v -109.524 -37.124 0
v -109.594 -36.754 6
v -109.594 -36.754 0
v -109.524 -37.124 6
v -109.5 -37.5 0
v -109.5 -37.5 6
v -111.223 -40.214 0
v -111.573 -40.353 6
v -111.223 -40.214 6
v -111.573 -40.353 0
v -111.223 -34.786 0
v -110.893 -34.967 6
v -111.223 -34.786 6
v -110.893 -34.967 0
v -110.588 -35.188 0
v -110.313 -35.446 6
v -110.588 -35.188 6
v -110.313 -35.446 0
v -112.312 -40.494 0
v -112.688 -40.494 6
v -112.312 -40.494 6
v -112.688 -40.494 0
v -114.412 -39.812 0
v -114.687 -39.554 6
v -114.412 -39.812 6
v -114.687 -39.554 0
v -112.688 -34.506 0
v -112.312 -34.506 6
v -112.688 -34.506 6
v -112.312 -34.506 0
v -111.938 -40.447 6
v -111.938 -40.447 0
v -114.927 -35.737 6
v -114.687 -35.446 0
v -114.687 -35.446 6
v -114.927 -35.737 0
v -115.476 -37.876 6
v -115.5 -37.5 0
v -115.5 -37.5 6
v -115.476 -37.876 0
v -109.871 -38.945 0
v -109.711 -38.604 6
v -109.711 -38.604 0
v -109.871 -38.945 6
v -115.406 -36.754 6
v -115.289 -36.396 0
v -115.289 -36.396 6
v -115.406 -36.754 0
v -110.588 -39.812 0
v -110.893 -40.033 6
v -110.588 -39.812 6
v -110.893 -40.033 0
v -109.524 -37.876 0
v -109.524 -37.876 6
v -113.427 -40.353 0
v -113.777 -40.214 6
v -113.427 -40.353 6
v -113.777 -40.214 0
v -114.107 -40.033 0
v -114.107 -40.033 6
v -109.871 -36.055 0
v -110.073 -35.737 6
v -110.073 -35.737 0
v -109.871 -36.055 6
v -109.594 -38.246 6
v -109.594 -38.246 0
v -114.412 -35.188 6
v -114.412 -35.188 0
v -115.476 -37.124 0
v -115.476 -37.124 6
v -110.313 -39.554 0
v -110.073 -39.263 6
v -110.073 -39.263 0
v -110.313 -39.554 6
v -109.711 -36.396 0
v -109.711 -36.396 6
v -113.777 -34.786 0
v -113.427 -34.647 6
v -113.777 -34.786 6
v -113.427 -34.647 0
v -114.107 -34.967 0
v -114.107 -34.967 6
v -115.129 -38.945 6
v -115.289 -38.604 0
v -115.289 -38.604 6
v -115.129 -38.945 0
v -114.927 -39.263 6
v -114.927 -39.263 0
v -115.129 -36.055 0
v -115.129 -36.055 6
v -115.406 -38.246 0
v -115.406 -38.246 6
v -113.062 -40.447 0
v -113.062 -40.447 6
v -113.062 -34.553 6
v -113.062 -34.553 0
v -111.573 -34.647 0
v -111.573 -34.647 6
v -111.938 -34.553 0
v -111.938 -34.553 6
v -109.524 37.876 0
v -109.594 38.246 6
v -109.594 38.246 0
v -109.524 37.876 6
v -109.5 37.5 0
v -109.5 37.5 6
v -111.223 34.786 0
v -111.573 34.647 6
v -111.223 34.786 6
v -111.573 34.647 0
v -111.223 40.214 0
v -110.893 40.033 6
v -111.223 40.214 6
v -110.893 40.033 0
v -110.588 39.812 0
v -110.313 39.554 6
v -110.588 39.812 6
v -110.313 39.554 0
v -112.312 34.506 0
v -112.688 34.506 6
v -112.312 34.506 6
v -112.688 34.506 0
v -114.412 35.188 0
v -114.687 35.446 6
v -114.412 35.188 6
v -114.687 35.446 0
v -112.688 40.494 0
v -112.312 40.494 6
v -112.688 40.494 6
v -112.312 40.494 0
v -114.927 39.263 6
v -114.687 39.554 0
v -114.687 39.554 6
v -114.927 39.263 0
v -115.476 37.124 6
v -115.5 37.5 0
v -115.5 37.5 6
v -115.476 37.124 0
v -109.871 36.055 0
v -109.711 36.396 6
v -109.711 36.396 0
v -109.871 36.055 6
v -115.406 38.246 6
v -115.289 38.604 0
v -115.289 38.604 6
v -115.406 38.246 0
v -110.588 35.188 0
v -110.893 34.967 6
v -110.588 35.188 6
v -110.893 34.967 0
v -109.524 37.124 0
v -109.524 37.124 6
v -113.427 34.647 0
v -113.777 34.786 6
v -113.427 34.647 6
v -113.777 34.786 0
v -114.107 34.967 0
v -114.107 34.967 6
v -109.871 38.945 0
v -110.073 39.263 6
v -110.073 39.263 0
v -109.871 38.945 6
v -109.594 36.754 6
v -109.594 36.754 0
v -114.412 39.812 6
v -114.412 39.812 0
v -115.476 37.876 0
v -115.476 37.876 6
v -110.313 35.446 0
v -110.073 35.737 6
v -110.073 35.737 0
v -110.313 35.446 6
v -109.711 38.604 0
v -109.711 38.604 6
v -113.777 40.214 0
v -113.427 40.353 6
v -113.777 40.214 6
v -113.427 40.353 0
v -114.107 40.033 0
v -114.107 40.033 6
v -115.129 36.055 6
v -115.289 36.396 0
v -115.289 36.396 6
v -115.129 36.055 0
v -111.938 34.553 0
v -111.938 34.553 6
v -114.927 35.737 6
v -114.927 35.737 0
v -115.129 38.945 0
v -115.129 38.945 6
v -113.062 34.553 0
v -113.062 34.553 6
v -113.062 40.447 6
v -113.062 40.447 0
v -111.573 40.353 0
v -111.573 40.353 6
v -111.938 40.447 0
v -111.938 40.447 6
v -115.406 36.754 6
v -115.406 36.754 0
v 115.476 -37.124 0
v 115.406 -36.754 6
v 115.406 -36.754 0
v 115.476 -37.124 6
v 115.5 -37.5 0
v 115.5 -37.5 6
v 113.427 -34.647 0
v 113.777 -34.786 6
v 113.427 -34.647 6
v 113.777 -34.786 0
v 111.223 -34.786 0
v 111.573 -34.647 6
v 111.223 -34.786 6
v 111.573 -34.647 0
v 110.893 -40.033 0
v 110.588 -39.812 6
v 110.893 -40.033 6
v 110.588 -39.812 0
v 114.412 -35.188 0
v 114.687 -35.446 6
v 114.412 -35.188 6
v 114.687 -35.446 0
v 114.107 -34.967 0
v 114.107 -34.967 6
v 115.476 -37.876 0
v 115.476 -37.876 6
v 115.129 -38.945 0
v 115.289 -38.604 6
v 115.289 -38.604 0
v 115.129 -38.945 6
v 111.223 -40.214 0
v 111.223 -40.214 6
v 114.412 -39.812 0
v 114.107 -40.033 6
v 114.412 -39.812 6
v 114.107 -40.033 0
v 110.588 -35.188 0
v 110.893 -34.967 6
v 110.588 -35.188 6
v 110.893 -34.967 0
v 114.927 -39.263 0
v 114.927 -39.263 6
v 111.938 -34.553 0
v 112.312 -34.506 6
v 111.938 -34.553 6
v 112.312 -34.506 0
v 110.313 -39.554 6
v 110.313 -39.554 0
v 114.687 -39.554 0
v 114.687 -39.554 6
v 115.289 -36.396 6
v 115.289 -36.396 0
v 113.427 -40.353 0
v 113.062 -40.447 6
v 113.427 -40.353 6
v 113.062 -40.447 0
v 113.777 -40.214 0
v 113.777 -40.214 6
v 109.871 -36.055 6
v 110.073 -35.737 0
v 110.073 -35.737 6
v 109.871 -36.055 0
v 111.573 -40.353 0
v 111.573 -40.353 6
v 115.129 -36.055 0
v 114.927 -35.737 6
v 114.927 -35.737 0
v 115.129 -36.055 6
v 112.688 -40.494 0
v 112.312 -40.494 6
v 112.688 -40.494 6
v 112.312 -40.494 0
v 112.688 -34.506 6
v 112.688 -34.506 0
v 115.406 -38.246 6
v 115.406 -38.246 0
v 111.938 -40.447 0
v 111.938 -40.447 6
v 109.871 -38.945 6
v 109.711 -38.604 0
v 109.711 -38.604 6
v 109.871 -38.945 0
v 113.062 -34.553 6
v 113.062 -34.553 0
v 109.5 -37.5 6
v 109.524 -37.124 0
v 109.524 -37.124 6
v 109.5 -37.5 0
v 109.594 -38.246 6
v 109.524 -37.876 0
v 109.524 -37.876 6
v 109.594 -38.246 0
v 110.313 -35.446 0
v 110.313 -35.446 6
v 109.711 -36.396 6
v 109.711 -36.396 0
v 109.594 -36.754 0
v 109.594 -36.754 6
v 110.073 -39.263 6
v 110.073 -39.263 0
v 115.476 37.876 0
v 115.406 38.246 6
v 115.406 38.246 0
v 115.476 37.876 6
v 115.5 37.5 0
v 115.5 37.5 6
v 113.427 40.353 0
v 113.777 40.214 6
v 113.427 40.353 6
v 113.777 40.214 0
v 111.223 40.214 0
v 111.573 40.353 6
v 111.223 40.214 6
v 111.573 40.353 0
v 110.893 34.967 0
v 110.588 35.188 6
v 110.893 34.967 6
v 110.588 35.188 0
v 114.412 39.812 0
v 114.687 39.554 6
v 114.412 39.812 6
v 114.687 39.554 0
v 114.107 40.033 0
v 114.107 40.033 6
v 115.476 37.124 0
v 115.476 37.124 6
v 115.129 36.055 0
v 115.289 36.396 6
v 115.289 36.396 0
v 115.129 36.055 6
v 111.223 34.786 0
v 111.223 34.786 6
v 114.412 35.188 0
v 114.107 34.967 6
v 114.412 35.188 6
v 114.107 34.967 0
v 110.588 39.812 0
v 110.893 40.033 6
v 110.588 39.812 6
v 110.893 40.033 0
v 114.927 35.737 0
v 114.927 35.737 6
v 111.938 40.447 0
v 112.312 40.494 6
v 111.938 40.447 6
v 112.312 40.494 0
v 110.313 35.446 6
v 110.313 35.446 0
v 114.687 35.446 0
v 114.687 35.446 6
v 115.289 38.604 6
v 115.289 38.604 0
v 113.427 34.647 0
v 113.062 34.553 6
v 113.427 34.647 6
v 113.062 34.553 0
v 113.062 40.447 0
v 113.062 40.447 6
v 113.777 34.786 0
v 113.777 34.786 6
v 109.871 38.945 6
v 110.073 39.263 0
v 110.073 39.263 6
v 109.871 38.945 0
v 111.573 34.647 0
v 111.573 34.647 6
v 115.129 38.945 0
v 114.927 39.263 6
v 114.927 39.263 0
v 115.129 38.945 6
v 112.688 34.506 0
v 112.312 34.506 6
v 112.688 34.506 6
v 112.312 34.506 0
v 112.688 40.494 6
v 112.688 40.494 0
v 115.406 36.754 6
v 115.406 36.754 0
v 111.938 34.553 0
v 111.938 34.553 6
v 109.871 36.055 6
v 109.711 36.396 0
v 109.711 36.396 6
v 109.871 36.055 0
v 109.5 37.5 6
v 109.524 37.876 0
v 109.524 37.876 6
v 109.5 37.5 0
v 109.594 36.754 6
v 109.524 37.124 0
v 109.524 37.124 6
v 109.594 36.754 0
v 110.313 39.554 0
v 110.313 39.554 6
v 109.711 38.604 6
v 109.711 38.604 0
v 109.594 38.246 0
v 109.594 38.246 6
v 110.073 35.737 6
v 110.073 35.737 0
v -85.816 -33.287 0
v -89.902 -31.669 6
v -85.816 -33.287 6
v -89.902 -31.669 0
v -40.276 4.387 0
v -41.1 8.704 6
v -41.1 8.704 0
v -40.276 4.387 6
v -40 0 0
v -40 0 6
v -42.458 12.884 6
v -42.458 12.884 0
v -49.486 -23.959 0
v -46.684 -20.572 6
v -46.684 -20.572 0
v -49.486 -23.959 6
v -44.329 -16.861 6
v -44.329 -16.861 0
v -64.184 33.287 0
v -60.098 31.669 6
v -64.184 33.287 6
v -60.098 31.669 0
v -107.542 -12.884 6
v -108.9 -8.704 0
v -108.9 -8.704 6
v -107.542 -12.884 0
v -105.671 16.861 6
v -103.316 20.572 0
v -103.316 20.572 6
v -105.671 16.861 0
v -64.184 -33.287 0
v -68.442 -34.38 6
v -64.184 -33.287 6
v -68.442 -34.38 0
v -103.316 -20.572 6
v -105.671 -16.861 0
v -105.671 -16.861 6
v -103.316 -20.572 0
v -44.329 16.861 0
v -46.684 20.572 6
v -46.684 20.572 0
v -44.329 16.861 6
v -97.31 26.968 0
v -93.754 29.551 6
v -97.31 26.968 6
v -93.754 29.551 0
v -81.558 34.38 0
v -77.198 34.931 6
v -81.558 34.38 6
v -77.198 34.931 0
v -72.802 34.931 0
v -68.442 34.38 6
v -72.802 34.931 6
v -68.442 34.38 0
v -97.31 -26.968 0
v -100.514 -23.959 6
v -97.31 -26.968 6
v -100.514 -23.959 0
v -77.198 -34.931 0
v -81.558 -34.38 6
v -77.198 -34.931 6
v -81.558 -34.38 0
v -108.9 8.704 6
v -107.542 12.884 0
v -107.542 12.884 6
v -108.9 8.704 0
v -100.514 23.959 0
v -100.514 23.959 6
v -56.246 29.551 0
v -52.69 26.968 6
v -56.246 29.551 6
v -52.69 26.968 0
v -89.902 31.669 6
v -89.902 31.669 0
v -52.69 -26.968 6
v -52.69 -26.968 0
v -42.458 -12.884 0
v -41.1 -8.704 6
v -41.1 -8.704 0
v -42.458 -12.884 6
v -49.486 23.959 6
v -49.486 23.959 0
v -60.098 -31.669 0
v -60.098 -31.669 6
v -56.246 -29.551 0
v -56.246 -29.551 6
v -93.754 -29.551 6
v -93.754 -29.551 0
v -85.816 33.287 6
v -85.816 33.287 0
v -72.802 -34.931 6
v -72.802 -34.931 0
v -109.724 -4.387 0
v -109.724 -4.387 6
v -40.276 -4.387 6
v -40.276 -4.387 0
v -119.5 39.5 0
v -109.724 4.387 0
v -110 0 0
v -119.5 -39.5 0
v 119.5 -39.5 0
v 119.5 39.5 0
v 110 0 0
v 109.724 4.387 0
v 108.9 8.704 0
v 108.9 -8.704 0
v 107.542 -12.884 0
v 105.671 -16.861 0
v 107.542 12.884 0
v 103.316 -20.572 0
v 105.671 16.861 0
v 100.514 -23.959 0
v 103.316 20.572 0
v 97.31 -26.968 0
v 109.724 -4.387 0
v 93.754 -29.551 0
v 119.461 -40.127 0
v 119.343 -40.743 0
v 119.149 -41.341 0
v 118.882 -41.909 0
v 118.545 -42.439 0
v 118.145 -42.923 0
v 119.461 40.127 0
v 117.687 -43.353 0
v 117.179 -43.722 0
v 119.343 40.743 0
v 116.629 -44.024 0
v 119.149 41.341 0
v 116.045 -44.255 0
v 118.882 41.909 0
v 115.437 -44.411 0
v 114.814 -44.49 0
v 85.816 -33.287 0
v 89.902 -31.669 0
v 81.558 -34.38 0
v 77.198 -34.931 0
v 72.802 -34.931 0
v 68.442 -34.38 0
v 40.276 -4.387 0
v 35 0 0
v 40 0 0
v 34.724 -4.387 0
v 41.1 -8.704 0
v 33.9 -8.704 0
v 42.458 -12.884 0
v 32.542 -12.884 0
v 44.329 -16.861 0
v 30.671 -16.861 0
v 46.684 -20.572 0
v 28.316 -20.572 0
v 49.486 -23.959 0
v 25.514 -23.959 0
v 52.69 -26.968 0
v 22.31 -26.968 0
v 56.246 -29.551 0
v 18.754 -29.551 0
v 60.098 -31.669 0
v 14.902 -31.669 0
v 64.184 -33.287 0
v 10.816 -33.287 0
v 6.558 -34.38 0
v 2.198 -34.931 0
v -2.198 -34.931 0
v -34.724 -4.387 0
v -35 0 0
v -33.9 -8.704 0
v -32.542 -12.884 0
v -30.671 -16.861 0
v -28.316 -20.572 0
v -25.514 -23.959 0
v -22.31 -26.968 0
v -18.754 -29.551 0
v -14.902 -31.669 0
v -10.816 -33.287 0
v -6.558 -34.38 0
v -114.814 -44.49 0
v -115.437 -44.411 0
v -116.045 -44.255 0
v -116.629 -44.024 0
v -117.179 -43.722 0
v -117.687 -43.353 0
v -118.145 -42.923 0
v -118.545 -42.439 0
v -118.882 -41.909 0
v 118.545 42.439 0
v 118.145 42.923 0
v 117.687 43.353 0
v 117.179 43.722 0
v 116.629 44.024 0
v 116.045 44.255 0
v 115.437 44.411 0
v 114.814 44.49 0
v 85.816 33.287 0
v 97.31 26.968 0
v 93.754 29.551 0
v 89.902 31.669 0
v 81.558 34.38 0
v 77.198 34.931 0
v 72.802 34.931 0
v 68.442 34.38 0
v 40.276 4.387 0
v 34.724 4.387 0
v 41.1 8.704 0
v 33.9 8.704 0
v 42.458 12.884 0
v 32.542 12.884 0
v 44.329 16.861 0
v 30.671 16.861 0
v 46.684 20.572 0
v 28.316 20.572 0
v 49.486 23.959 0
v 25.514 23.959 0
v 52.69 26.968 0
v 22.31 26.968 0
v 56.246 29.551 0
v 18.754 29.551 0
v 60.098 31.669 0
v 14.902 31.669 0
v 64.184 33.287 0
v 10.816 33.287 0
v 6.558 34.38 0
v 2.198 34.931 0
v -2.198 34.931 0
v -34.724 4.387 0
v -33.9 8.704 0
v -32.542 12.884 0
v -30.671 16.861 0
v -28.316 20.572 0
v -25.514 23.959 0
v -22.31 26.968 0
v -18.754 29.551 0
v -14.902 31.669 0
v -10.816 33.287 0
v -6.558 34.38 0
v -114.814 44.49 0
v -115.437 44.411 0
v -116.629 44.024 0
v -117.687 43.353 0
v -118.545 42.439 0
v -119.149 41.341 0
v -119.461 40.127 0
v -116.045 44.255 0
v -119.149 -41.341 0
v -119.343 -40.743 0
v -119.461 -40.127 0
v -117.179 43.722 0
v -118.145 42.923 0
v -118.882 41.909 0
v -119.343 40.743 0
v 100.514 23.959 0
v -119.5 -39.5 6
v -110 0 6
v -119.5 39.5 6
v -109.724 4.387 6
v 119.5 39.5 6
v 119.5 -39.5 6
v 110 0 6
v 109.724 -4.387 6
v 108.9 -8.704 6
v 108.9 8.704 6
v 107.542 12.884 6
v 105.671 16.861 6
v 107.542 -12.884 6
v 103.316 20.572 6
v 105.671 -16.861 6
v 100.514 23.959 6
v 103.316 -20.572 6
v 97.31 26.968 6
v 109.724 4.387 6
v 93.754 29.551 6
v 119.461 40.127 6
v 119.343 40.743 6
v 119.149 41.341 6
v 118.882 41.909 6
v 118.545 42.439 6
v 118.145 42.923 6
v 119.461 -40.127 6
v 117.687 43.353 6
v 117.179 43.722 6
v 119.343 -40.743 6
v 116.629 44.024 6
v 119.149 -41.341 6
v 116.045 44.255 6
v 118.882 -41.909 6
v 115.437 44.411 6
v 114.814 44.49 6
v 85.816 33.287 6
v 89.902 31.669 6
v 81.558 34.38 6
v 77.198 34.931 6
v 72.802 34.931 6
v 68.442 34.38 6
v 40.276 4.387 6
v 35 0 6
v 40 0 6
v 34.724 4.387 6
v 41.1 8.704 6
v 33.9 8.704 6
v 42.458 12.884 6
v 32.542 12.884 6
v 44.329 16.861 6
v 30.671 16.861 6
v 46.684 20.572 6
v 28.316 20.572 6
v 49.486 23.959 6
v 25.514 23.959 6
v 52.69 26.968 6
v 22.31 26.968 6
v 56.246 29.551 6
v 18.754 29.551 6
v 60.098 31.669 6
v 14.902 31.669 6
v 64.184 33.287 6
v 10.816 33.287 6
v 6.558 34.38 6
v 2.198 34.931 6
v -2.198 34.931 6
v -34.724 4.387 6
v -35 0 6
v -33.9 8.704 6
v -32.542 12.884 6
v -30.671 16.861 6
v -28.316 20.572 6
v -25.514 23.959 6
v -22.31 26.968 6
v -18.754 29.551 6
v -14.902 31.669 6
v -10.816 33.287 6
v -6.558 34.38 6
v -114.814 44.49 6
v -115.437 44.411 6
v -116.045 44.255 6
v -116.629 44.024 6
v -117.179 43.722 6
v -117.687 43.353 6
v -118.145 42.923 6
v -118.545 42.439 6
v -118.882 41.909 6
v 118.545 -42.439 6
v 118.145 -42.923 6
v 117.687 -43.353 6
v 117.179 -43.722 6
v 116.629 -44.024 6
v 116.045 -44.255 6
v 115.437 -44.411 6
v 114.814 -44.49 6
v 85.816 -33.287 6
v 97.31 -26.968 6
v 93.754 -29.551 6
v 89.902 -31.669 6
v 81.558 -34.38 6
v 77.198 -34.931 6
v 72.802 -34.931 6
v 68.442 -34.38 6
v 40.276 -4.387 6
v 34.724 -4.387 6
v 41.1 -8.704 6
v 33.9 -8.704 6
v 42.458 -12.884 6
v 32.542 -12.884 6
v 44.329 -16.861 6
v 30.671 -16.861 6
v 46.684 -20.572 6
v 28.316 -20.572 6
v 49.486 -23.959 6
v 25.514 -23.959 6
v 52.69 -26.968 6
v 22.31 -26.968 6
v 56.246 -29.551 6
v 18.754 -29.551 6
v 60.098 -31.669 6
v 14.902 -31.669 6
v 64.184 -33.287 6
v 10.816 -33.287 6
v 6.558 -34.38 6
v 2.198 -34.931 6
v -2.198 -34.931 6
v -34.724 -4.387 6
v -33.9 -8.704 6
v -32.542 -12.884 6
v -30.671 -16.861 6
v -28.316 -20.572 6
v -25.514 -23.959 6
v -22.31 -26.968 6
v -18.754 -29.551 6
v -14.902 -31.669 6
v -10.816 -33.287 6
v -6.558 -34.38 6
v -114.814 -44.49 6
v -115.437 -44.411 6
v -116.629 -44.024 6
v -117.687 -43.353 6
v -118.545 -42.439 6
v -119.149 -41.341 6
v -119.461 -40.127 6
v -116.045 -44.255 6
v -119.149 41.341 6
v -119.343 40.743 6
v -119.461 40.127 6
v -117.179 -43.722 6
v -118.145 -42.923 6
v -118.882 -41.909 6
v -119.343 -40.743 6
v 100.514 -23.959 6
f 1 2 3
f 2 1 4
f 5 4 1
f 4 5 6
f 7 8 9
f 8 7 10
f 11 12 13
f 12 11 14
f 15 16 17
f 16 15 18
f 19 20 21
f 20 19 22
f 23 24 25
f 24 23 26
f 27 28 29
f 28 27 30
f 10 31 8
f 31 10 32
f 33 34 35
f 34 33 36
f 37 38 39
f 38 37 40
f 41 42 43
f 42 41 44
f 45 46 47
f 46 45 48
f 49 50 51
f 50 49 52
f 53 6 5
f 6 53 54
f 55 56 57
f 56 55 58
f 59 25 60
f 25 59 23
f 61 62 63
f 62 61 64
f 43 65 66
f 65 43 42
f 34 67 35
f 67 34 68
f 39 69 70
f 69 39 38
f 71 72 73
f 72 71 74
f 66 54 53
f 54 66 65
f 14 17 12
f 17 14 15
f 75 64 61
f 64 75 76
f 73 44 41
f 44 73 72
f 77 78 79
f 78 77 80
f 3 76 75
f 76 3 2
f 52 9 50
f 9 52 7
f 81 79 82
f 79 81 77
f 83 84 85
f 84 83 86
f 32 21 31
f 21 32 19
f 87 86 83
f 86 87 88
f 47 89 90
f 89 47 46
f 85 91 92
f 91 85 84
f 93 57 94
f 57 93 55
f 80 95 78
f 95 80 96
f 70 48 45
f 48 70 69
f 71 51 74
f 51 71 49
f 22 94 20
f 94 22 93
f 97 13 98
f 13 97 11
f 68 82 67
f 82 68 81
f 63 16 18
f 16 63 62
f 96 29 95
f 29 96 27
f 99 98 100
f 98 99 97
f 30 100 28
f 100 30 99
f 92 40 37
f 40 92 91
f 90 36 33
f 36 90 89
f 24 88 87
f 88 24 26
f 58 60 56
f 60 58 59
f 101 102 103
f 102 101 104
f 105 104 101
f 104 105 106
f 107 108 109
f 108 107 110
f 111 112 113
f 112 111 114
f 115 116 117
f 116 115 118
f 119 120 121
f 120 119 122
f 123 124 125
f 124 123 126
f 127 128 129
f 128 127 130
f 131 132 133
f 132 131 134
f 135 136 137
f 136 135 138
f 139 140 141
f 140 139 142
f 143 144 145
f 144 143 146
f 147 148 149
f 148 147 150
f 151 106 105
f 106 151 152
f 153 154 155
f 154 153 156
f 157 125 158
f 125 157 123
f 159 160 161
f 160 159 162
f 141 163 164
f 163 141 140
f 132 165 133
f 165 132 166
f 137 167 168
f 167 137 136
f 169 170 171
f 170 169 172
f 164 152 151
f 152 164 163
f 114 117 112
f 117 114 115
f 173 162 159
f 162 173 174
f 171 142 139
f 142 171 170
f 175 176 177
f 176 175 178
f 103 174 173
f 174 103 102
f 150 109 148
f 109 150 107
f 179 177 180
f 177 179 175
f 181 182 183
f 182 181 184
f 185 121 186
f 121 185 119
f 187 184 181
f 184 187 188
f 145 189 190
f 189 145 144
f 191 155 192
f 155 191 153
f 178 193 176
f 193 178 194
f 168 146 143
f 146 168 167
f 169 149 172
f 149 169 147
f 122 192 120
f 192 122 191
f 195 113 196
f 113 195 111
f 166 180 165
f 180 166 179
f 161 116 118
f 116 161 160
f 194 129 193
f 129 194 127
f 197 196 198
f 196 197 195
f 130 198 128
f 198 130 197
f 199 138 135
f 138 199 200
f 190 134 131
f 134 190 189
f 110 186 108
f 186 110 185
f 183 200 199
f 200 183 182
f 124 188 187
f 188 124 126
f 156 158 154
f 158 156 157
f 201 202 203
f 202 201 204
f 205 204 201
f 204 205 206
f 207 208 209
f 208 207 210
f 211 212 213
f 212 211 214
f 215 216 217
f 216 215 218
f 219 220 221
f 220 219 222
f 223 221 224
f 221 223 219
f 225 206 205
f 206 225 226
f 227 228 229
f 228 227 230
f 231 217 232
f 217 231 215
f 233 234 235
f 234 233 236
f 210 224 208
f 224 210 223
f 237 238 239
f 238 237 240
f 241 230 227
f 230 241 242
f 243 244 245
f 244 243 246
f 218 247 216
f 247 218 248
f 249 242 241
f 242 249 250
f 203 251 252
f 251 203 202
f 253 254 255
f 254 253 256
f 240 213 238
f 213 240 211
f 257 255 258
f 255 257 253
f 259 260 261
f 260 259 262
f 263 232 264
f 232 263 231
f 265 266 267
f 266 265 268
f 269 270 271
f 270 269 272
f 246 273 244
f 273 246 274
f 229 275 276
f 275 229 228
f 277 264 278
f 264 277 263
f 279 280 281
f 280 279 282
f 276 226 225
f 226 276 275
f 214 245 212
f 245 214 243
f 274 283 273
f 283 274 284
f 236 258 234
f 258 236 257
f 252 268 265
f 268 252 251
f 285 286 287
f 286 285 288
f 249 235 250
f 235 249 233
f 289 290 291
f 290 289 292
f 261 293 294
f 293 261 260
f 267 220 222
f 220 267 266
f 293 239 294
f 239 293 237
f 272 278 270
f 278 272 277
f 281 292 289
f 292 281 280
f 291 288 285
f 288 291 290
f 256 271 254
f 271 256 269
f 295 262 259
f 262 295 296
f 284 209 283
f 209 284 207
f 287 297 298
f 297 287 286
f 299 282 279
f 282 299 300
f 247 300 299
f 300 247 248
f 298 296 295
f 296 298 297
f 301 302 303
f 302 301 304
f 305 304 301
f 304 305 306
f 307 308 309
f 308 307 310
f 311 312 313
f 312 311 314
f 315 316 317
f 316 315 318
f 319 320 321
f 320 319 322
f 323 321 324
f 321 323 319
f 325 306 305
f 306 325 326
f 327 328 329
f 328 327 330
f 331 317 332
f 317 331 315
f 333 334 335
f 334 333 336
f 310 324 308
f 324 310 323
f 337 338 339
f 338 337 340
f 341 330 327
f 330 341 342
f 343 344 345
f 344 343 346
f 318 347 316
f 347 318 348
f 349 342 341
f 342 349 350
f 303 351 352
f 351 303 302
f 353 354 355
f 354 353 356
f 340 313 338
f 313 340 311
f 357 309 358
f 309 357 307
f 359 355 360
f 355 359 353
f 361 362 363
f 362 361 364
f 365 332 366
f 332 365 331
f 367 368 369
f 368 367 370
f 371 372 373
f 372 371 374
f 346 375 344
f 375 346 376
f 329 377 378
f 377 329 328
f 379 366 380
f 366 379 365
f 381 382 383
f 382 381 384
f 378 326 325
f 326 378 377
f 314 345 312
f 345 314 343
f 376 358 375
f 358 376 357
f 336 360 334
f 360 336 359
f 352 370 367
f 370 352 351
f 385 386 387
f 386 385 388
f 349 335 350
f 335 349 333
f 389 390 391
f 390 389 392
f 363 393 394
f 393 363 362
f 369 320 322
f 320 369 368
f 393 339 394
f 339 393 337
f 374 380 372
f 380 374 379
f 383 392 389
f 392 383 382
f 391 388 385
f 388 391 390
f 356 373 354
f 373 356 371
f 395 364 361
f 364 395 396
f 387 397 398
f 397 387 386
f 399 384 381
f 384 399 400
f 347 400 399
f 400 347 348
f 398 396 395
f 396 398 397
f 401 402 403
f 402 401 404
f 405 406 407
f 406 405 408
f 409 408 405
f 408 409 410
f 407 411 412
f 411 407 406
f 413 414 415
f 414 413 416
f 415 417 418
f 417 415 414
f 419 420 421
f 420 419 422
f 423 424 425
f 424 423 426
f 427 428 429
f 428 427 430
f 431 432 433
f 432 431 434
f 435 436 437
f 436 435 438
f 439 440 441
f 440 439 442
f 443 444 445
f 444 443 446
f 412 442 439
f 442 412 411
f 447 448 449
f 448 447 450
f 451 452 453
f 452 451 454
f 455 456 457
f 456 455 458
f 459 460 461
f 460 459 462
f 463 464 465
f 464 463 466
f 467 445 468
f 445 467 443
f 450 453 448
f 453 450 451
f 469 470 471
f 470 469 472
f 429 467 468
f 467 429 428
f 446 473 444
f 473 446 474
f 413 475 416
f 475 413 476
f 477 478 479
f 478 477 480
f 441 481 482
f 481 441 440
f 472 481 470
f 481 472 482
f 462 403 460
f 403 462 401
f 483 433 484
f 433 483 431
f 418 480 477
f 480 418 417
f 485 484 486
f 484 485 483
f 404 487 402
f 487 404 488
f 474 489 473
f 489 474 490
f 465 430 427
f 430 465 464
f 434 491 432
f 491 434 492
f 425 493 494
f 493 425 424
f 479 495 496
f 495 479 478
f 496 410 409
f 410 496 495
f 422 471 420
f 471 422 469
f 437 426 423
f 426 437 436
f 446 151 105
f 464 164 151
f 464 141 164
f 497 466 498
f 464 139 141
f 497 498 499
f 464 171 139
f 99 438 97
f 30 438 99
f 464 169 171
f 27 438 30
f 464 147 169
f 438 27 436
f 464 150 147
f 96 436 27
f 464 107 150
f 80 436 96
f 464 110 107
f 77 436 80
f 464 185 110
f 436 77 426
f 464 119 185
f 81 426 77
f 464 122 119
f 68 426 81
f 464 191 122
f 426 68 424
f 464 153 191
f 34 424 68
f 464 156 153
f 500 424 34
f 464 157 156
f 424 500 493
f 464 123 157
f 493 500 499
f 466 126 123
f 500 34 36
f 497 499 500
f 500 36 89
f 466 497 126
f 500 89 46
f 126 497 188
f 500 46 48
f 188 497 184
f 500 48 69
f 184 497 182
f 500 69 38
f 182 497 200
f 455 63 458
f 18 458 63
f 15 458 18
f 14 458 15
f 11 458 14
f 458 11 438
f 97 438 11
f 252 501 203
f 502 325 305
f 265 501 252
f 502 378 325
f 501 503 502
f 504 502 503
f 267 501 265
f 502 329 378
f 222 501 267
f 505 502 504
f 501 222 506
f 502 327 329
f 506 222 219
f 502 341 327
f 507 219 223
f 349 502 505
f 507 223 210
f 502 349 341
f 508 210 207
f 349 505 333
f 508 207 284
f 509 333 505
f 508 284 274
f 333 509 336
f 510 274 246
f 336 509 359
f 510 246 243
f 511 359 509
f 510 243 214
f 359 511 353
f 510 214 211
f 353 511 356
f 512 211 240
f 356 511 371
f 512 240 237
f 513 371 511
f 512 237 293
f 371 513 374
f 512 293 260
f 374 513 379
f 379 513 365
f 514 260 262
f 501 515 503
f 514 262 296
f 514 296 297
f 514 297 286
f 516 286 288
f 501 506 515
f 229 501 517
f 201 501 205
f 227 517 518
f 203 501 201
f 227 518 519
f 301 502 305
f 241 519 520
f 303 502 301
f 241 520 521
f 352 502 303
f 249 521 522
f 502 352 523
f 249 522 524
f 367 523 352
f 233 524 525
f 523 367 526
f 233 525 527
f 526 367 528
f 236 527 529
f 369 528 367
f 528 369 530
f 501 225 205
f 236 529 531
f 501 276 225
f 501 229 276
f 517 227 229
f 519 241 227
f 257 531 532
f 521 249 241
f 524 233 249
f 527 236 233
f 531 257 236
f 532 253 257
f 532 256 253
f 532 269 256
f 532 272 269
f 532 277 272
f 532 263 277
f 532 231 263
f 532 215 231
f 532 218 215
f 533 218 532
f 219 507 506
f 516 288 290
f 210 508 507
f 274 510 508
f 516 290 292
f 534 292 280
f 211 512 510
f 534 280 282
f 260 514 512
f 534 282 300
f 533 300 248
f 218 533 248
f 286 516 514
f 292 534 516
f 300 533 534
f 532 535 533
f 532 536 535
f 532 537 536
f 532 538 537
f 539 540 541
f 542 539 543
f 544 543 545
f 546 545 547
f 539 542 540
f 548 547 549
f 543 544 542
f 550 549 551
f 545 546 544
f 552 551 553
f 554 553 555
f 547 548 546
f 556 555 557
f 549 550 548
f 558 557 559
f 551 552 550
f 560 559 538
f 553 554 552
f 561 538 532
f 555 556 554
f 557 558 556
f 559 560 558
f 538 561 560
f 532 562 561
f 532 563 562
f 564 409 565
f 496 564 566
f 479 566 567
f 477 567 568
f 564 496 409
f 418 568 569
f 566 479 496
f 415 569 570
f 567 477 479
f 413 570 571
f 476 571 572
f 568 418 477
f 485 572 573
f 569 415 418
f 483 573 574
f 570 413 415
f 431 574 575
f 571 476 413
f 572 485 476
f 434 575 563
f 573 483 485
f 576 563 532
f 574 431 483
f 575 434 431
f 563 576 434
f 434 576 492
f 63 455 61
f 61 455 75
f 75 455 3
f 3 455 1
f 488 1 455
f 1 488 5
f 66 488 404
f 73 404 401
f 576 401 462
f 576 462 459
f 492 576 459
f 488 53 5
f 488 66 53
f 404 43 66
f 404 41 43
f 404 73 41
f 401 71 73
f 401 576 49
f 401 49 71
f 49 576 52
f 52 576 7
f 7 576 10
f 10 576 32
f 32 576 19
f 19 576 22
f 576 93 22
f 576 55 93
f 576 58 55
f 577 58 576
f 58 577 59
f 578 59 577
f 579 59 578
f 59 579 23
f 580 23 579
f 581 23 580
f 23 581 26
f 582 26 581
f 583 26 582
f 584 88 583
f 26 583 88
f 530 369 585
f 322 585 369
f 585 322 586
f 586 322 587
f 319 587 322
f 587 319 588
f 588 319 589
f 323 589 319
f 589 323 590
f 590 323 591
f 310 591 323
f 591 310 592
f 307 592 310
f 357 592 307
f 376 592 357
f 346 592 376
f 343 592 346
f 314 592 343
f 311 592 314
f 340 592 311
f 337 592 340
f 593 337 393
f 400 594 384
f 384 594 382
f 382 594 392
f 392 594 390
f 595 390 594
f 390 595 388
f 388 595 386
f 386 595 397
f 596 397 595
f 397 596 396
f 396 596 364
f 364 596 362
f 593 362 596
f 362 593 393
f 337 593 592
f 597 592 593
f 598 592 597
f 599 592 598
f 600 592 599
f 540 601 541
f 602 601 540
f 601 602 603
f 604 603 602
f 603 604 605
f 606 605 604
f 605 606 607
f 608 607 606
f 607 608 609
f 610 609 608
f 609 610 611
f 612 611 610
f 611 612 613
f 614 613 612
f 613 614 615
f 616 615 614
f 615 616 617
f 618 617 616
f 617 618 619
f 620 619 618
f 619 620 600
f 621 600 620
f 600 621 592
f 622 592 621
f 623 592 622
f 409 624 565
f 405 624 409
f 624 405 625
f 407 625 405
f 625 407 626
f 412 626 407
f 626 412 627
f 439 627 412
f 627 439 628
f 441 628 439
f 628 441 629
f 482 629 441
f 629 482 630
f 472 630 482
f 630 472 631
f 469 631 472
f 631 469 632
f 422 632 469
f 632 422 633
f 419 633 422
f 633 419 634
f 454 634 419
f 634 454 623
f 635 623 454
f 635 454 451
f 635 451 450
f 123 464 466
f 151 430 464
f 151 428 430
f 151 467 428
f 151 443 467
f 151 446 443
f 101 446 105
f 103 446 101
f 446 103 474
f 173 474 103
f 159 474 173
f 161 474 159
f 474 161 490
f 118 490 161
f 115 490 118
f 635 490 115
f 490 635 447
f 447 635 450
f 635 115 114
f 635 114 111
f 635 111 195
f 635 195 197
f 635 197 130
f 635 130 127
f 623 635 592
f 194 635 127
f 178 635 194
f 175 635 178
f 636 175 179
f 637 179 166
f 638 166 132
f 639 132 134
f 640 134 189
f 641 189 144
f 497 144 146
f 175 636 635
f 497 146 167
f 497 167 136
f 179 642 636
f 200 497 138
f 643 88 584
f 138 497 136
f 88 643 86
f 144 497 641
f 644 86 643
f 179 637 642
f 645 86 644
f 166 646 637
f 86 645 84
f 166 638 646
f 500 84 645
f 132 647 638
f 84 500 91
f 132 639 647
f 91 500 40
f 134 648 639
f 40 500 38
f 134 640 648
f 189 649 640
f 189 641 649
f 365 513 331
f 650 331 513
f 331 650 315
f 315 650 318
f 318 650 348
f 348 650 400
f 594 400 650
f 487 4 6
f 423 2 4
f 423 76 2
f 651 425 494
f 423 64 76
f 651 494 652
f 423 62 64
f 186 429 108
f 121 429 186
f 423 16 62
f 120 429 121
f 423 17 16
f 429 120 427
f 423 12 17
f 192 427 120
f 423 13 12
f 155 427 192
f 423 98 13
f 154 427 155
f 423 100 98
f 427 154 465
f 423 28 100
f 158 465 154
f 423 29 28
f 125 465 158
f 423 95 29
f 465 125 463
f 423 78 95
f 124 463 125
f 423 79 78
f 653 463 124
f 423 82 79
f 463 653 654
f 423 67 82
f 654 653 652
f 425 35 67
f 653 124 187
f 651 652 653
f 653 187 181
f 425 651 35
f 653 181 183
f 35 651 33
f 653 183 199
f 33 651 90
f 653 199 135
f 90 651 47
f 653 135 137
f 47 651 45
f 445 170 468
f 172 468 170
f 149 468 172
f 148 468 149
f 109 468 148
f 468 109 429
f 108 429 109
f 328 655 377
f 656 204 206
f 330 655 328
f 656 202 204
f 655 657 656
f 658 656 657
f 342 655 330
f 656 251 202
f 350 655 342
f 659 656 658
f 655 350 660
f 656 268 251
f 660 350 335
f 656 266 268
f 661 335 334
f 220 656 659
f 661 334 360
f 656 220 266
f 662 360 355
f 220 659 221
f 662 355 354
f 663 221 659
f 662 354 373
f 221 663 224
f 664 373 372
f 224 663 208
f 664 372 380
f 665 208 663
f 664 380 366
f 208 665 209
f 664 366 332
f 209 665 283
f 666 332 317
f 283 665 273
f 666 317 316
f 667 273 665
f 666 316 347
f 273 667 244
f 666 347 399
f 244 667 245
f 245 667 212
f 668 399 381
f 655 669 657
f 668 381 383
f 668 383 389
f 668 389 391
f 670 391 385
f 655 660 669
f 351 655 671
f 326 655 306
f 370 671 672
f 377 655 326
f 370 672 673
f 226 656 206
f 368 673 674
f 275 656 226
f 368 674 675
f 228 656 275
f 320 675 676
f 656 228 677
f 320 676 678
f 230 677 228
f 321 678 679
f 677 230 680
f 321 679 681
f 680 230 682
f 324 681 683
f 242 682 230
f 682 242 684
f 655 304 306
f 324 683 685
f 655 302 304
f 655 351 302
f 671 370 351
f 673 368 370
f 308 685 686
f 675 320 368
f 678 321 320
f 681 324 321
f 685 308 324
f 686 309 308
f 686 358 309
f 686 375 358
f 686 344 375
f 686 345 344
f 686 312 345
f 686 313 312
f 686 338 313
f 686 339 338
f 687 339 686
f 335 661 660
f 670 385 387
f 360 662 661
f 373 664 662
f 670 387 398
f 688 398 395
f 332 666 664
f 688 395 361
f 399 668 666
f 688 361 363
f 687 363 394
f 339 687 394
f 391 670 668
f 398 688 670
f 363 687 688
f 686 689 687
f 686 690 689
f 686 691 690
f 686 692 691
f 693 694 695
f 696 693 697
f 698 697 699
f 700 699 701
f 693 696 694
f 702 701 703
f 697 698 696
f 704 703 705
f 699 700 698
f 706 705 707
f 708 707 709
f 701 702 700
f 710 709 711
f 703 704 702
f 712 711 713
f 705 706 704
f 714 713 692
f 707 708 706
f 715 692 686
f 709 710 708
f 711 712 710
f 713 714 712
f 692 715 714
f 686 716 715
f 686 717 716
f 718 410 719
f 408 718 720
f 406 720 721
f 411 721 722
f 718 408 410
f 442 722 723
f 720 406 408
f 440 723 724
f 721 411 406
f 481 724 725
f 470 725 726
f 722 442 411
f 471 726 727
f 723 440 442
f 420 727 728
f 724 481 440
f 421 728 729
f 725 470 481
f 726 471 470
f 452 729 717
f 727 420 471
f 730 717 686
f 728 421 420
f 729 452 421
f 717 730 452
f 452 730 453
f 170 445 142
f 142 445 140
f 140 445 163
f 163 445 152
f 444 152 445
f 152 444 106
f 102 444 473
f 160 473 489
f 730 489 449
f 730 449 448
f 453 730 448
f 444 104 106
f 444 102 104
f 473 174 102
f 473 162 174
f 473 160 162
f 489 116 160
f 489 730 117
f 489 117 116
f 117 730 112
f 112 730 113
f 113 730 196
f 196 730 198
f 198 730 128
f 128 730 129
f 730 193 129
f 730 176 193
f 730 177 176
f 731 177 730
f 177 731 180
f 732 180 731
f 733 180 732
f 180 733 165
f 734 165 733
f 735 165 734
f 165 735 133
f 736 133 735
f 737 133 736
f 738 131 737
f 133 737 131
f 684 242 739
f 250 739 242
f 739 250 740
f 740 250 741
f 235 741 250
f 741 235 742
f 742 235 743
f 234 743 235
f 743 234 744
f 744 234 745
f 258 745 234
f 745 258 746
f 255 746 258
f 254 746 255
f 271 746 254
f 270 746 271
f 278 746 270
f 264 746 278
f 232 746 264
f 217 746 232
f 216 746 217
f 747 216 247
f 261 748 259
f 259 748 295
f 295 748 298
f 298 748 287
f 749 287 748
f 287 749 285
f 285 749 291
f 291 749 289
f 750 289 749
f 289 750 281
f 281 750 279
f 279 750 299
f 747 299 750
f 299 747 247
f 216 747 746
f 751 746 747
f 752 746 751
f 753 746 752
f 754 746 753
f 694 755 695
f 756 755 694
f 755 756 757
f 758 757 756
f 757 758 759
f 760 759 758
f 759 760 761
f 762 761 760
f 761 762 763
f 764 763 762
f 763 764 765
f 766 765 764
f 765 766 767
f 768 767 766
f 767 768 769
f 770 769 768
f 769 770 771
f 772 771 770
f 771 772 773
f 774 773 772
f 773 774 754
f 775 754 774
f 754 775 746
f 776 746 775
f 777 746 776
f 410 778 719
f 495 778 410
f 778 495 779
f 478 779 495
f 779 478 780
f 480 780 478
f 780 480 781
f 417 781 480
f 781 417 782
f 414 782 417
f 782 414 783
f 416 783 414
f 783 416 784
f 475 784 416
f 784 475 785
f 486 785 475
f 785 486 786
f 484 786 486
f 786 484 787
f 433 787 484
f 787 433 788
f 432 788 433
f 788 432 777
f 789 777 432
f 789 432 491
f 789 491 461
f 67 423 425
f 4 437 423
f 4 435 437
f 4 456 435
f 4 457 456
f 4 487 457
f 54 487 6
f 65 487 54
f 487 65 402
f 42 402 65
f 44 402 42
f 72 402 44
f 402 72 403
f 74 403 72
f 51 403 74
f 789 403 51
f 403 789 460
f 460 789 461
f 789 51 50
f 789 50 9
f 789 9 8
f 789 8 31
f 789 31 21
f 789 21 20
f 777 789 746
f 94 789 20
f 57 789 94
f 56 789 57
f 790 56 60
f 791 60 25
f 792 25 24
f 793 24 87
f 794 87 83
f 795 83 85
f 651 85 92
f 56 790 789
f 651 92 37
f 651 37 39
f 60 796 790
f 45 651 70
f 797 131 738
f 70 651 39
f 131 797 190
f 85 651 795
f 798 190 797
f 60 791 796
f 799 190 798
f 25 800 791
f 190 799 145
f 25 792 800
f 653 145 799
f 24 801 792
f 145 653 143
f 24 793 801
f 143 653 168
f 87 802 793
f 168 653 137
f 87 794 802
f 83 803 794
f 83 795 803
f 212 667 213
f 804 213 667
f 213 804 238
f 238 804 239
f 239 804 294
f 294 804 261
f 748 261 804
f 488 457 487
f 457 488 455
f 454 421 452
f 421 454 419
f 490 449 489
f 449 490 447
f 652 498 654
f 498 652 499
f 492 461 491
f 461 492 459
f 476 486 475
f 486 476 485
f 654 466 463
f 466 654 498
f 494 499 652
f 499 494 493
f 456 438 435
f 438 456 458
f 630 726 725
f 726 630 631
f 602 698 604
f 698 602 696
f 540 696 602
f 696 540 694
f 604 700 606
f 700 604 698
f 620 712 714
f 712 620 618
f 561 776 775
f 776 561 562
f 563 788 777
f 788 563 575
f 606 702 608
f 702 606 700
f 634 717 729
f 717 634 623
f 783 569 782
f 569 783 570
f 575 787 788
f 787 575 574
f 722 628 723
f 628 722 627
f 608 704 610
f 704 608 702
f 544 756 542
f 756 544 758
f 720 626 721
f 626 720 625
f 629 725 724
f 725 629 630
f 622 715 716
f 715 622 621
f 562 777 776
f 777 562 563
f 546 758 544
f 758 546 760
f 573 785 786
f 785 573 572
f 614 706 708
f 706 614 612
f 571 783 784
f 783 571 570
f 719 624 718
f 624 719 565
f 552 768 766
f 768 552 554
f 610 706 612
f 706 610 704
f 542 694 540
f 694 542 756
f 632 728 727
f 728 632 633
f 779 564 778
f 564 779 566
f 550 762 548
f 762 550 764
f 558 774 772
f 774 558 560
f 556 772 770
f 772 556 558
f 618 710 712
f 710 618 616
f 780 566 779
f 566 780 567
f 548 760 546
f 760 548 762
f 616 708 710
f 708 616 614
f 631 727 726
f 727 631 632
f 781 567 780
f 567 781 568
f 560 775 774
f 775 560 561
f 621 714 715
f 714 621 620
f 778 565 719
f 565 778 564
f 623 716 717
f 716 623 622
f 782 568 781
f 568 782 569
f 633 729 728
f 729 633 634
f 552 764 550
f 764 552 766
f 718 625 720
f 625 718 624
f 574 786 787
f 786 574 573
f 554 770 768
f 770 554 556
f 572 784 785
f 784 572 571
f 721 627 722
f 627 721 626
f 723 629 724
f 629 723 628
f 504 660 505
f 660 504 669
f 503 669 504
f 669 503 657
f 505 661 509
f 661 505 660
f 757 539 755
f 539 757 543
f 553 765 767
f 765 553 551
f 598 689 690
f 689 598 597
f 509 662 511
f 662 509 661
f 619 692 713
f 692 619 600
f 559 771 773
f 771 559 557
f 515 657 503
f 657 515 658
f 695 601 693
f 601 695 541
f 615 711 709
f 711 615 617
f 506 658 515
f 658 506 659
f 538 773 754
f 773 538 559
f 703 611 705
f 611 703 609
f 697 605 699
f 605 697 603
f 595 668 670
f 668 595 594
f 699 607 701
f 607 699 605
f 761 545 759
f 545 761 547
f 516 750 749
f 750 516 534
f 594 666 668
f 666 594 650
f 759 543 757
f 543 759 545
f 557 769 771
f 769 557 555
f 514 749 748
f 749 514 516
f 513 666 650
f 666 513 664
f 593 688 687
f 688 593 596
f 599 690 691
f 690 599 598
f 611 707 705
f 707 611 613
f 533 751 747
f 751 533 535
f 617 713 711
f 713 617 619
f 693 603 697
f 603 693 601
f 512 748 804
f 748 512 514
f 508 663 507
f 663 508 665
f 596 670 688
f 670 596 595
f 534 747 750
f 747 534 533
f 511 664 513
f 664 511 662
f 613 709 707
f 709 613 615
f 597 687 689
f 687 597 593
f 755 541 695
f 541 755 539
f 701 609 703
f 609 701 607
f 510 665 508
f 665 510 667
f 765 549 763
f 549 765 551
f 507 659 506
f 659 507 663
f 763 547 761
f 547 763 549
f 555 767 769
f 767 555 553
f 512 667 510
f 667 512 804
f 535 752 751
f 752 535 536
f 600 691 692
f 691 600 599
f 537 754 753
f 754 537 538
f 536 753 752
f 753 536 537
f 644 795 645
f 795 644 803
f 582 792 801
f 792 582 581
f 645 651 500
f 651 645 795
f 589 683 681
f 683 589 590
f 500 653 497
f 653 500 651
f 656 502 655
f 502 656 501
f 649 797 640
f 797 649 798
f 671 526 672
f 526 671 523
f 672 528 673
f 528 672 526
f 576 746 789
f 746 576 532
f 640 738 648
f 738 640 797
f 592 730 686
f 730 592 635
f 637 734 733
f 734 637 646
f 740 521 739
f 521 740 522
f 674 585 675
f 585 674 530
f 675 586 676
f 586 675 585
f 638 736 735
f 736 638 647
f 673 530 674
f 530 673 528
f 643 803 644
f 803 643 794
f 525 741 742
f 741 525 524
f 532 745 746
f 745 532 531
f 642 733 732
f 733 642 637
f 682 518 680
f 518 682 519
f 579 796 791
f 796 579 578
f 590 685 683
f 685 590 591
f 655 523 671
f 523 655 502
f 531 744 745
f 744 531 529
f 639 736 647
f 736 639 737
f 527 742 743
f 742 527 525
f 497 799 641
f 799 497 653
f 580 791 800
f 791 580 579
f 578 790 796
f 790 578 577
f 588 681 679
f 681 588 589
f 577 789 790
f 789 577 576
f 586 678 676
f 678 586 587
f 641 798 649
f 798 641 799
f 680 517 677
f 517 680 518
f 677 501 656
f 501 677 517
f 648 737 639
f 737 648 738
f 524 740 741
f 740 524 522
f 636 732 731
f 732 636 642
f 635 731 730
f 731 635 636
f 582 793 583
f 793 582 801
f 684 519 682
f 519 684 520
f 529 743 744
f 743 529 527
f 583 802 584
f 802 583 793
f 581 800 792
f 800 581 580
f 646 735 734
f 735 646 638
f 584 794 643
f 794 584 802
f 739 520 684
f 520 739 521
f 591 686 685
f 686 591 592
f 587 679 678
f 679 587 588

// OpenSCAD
$fn = 50;


difference() {
	union() {
		hull() {
			translate(v = [-114.5000000000, 39.5000000000, 0]) {
				cylinder(h = 6, r = 5);
			}
			translate(v = [114.5000000000, 39.5000000000, 0]) {
				cylinder(h = 6, r = 5);
			}
			translate(v = [-114.5000000000, -39.5000000000, 0]) {
				cylinder(h = 6, r = 5);
			}
			translate(v = [114.5000000000, -39.5000000000, 0]) {
				cylinder(h = 6, r = 5);
			}
		}
	}
	union() {
		#translate(v = [-112.5000000000, -37.5000000000, -100.0000000000]) {
			cylinder(h = 200, r = 3.0000000000);
		}
		#translate(v = [-112.5000000000, 37.5000000000, -100.0000000000]) {
			cylinder(h = 200, r = 3.0000000000);
		}
		#translate(v = [112.5000000000, -37.5000000000, -100.0000000000]) {
			cylinder(h = 200, r = 3.0000000000);
		}
		#translate(v = [112.5000000000, 37.5000000000, -100.0000000000]) {
			cylinder(h = 200, r = 3.0000000000);
		}
		#translate(v = [-75.0000000000, 0, 0]) {
			cylinder(h = 6, r = 35.0000000000);
		}
		#cylinder(h = 6, r = 35.0000000000);
		#translate(v = [75.0000000000, 0, 0]) {
			cylinder(h = 6, r = 35.0000000000);
		}
	}
}
